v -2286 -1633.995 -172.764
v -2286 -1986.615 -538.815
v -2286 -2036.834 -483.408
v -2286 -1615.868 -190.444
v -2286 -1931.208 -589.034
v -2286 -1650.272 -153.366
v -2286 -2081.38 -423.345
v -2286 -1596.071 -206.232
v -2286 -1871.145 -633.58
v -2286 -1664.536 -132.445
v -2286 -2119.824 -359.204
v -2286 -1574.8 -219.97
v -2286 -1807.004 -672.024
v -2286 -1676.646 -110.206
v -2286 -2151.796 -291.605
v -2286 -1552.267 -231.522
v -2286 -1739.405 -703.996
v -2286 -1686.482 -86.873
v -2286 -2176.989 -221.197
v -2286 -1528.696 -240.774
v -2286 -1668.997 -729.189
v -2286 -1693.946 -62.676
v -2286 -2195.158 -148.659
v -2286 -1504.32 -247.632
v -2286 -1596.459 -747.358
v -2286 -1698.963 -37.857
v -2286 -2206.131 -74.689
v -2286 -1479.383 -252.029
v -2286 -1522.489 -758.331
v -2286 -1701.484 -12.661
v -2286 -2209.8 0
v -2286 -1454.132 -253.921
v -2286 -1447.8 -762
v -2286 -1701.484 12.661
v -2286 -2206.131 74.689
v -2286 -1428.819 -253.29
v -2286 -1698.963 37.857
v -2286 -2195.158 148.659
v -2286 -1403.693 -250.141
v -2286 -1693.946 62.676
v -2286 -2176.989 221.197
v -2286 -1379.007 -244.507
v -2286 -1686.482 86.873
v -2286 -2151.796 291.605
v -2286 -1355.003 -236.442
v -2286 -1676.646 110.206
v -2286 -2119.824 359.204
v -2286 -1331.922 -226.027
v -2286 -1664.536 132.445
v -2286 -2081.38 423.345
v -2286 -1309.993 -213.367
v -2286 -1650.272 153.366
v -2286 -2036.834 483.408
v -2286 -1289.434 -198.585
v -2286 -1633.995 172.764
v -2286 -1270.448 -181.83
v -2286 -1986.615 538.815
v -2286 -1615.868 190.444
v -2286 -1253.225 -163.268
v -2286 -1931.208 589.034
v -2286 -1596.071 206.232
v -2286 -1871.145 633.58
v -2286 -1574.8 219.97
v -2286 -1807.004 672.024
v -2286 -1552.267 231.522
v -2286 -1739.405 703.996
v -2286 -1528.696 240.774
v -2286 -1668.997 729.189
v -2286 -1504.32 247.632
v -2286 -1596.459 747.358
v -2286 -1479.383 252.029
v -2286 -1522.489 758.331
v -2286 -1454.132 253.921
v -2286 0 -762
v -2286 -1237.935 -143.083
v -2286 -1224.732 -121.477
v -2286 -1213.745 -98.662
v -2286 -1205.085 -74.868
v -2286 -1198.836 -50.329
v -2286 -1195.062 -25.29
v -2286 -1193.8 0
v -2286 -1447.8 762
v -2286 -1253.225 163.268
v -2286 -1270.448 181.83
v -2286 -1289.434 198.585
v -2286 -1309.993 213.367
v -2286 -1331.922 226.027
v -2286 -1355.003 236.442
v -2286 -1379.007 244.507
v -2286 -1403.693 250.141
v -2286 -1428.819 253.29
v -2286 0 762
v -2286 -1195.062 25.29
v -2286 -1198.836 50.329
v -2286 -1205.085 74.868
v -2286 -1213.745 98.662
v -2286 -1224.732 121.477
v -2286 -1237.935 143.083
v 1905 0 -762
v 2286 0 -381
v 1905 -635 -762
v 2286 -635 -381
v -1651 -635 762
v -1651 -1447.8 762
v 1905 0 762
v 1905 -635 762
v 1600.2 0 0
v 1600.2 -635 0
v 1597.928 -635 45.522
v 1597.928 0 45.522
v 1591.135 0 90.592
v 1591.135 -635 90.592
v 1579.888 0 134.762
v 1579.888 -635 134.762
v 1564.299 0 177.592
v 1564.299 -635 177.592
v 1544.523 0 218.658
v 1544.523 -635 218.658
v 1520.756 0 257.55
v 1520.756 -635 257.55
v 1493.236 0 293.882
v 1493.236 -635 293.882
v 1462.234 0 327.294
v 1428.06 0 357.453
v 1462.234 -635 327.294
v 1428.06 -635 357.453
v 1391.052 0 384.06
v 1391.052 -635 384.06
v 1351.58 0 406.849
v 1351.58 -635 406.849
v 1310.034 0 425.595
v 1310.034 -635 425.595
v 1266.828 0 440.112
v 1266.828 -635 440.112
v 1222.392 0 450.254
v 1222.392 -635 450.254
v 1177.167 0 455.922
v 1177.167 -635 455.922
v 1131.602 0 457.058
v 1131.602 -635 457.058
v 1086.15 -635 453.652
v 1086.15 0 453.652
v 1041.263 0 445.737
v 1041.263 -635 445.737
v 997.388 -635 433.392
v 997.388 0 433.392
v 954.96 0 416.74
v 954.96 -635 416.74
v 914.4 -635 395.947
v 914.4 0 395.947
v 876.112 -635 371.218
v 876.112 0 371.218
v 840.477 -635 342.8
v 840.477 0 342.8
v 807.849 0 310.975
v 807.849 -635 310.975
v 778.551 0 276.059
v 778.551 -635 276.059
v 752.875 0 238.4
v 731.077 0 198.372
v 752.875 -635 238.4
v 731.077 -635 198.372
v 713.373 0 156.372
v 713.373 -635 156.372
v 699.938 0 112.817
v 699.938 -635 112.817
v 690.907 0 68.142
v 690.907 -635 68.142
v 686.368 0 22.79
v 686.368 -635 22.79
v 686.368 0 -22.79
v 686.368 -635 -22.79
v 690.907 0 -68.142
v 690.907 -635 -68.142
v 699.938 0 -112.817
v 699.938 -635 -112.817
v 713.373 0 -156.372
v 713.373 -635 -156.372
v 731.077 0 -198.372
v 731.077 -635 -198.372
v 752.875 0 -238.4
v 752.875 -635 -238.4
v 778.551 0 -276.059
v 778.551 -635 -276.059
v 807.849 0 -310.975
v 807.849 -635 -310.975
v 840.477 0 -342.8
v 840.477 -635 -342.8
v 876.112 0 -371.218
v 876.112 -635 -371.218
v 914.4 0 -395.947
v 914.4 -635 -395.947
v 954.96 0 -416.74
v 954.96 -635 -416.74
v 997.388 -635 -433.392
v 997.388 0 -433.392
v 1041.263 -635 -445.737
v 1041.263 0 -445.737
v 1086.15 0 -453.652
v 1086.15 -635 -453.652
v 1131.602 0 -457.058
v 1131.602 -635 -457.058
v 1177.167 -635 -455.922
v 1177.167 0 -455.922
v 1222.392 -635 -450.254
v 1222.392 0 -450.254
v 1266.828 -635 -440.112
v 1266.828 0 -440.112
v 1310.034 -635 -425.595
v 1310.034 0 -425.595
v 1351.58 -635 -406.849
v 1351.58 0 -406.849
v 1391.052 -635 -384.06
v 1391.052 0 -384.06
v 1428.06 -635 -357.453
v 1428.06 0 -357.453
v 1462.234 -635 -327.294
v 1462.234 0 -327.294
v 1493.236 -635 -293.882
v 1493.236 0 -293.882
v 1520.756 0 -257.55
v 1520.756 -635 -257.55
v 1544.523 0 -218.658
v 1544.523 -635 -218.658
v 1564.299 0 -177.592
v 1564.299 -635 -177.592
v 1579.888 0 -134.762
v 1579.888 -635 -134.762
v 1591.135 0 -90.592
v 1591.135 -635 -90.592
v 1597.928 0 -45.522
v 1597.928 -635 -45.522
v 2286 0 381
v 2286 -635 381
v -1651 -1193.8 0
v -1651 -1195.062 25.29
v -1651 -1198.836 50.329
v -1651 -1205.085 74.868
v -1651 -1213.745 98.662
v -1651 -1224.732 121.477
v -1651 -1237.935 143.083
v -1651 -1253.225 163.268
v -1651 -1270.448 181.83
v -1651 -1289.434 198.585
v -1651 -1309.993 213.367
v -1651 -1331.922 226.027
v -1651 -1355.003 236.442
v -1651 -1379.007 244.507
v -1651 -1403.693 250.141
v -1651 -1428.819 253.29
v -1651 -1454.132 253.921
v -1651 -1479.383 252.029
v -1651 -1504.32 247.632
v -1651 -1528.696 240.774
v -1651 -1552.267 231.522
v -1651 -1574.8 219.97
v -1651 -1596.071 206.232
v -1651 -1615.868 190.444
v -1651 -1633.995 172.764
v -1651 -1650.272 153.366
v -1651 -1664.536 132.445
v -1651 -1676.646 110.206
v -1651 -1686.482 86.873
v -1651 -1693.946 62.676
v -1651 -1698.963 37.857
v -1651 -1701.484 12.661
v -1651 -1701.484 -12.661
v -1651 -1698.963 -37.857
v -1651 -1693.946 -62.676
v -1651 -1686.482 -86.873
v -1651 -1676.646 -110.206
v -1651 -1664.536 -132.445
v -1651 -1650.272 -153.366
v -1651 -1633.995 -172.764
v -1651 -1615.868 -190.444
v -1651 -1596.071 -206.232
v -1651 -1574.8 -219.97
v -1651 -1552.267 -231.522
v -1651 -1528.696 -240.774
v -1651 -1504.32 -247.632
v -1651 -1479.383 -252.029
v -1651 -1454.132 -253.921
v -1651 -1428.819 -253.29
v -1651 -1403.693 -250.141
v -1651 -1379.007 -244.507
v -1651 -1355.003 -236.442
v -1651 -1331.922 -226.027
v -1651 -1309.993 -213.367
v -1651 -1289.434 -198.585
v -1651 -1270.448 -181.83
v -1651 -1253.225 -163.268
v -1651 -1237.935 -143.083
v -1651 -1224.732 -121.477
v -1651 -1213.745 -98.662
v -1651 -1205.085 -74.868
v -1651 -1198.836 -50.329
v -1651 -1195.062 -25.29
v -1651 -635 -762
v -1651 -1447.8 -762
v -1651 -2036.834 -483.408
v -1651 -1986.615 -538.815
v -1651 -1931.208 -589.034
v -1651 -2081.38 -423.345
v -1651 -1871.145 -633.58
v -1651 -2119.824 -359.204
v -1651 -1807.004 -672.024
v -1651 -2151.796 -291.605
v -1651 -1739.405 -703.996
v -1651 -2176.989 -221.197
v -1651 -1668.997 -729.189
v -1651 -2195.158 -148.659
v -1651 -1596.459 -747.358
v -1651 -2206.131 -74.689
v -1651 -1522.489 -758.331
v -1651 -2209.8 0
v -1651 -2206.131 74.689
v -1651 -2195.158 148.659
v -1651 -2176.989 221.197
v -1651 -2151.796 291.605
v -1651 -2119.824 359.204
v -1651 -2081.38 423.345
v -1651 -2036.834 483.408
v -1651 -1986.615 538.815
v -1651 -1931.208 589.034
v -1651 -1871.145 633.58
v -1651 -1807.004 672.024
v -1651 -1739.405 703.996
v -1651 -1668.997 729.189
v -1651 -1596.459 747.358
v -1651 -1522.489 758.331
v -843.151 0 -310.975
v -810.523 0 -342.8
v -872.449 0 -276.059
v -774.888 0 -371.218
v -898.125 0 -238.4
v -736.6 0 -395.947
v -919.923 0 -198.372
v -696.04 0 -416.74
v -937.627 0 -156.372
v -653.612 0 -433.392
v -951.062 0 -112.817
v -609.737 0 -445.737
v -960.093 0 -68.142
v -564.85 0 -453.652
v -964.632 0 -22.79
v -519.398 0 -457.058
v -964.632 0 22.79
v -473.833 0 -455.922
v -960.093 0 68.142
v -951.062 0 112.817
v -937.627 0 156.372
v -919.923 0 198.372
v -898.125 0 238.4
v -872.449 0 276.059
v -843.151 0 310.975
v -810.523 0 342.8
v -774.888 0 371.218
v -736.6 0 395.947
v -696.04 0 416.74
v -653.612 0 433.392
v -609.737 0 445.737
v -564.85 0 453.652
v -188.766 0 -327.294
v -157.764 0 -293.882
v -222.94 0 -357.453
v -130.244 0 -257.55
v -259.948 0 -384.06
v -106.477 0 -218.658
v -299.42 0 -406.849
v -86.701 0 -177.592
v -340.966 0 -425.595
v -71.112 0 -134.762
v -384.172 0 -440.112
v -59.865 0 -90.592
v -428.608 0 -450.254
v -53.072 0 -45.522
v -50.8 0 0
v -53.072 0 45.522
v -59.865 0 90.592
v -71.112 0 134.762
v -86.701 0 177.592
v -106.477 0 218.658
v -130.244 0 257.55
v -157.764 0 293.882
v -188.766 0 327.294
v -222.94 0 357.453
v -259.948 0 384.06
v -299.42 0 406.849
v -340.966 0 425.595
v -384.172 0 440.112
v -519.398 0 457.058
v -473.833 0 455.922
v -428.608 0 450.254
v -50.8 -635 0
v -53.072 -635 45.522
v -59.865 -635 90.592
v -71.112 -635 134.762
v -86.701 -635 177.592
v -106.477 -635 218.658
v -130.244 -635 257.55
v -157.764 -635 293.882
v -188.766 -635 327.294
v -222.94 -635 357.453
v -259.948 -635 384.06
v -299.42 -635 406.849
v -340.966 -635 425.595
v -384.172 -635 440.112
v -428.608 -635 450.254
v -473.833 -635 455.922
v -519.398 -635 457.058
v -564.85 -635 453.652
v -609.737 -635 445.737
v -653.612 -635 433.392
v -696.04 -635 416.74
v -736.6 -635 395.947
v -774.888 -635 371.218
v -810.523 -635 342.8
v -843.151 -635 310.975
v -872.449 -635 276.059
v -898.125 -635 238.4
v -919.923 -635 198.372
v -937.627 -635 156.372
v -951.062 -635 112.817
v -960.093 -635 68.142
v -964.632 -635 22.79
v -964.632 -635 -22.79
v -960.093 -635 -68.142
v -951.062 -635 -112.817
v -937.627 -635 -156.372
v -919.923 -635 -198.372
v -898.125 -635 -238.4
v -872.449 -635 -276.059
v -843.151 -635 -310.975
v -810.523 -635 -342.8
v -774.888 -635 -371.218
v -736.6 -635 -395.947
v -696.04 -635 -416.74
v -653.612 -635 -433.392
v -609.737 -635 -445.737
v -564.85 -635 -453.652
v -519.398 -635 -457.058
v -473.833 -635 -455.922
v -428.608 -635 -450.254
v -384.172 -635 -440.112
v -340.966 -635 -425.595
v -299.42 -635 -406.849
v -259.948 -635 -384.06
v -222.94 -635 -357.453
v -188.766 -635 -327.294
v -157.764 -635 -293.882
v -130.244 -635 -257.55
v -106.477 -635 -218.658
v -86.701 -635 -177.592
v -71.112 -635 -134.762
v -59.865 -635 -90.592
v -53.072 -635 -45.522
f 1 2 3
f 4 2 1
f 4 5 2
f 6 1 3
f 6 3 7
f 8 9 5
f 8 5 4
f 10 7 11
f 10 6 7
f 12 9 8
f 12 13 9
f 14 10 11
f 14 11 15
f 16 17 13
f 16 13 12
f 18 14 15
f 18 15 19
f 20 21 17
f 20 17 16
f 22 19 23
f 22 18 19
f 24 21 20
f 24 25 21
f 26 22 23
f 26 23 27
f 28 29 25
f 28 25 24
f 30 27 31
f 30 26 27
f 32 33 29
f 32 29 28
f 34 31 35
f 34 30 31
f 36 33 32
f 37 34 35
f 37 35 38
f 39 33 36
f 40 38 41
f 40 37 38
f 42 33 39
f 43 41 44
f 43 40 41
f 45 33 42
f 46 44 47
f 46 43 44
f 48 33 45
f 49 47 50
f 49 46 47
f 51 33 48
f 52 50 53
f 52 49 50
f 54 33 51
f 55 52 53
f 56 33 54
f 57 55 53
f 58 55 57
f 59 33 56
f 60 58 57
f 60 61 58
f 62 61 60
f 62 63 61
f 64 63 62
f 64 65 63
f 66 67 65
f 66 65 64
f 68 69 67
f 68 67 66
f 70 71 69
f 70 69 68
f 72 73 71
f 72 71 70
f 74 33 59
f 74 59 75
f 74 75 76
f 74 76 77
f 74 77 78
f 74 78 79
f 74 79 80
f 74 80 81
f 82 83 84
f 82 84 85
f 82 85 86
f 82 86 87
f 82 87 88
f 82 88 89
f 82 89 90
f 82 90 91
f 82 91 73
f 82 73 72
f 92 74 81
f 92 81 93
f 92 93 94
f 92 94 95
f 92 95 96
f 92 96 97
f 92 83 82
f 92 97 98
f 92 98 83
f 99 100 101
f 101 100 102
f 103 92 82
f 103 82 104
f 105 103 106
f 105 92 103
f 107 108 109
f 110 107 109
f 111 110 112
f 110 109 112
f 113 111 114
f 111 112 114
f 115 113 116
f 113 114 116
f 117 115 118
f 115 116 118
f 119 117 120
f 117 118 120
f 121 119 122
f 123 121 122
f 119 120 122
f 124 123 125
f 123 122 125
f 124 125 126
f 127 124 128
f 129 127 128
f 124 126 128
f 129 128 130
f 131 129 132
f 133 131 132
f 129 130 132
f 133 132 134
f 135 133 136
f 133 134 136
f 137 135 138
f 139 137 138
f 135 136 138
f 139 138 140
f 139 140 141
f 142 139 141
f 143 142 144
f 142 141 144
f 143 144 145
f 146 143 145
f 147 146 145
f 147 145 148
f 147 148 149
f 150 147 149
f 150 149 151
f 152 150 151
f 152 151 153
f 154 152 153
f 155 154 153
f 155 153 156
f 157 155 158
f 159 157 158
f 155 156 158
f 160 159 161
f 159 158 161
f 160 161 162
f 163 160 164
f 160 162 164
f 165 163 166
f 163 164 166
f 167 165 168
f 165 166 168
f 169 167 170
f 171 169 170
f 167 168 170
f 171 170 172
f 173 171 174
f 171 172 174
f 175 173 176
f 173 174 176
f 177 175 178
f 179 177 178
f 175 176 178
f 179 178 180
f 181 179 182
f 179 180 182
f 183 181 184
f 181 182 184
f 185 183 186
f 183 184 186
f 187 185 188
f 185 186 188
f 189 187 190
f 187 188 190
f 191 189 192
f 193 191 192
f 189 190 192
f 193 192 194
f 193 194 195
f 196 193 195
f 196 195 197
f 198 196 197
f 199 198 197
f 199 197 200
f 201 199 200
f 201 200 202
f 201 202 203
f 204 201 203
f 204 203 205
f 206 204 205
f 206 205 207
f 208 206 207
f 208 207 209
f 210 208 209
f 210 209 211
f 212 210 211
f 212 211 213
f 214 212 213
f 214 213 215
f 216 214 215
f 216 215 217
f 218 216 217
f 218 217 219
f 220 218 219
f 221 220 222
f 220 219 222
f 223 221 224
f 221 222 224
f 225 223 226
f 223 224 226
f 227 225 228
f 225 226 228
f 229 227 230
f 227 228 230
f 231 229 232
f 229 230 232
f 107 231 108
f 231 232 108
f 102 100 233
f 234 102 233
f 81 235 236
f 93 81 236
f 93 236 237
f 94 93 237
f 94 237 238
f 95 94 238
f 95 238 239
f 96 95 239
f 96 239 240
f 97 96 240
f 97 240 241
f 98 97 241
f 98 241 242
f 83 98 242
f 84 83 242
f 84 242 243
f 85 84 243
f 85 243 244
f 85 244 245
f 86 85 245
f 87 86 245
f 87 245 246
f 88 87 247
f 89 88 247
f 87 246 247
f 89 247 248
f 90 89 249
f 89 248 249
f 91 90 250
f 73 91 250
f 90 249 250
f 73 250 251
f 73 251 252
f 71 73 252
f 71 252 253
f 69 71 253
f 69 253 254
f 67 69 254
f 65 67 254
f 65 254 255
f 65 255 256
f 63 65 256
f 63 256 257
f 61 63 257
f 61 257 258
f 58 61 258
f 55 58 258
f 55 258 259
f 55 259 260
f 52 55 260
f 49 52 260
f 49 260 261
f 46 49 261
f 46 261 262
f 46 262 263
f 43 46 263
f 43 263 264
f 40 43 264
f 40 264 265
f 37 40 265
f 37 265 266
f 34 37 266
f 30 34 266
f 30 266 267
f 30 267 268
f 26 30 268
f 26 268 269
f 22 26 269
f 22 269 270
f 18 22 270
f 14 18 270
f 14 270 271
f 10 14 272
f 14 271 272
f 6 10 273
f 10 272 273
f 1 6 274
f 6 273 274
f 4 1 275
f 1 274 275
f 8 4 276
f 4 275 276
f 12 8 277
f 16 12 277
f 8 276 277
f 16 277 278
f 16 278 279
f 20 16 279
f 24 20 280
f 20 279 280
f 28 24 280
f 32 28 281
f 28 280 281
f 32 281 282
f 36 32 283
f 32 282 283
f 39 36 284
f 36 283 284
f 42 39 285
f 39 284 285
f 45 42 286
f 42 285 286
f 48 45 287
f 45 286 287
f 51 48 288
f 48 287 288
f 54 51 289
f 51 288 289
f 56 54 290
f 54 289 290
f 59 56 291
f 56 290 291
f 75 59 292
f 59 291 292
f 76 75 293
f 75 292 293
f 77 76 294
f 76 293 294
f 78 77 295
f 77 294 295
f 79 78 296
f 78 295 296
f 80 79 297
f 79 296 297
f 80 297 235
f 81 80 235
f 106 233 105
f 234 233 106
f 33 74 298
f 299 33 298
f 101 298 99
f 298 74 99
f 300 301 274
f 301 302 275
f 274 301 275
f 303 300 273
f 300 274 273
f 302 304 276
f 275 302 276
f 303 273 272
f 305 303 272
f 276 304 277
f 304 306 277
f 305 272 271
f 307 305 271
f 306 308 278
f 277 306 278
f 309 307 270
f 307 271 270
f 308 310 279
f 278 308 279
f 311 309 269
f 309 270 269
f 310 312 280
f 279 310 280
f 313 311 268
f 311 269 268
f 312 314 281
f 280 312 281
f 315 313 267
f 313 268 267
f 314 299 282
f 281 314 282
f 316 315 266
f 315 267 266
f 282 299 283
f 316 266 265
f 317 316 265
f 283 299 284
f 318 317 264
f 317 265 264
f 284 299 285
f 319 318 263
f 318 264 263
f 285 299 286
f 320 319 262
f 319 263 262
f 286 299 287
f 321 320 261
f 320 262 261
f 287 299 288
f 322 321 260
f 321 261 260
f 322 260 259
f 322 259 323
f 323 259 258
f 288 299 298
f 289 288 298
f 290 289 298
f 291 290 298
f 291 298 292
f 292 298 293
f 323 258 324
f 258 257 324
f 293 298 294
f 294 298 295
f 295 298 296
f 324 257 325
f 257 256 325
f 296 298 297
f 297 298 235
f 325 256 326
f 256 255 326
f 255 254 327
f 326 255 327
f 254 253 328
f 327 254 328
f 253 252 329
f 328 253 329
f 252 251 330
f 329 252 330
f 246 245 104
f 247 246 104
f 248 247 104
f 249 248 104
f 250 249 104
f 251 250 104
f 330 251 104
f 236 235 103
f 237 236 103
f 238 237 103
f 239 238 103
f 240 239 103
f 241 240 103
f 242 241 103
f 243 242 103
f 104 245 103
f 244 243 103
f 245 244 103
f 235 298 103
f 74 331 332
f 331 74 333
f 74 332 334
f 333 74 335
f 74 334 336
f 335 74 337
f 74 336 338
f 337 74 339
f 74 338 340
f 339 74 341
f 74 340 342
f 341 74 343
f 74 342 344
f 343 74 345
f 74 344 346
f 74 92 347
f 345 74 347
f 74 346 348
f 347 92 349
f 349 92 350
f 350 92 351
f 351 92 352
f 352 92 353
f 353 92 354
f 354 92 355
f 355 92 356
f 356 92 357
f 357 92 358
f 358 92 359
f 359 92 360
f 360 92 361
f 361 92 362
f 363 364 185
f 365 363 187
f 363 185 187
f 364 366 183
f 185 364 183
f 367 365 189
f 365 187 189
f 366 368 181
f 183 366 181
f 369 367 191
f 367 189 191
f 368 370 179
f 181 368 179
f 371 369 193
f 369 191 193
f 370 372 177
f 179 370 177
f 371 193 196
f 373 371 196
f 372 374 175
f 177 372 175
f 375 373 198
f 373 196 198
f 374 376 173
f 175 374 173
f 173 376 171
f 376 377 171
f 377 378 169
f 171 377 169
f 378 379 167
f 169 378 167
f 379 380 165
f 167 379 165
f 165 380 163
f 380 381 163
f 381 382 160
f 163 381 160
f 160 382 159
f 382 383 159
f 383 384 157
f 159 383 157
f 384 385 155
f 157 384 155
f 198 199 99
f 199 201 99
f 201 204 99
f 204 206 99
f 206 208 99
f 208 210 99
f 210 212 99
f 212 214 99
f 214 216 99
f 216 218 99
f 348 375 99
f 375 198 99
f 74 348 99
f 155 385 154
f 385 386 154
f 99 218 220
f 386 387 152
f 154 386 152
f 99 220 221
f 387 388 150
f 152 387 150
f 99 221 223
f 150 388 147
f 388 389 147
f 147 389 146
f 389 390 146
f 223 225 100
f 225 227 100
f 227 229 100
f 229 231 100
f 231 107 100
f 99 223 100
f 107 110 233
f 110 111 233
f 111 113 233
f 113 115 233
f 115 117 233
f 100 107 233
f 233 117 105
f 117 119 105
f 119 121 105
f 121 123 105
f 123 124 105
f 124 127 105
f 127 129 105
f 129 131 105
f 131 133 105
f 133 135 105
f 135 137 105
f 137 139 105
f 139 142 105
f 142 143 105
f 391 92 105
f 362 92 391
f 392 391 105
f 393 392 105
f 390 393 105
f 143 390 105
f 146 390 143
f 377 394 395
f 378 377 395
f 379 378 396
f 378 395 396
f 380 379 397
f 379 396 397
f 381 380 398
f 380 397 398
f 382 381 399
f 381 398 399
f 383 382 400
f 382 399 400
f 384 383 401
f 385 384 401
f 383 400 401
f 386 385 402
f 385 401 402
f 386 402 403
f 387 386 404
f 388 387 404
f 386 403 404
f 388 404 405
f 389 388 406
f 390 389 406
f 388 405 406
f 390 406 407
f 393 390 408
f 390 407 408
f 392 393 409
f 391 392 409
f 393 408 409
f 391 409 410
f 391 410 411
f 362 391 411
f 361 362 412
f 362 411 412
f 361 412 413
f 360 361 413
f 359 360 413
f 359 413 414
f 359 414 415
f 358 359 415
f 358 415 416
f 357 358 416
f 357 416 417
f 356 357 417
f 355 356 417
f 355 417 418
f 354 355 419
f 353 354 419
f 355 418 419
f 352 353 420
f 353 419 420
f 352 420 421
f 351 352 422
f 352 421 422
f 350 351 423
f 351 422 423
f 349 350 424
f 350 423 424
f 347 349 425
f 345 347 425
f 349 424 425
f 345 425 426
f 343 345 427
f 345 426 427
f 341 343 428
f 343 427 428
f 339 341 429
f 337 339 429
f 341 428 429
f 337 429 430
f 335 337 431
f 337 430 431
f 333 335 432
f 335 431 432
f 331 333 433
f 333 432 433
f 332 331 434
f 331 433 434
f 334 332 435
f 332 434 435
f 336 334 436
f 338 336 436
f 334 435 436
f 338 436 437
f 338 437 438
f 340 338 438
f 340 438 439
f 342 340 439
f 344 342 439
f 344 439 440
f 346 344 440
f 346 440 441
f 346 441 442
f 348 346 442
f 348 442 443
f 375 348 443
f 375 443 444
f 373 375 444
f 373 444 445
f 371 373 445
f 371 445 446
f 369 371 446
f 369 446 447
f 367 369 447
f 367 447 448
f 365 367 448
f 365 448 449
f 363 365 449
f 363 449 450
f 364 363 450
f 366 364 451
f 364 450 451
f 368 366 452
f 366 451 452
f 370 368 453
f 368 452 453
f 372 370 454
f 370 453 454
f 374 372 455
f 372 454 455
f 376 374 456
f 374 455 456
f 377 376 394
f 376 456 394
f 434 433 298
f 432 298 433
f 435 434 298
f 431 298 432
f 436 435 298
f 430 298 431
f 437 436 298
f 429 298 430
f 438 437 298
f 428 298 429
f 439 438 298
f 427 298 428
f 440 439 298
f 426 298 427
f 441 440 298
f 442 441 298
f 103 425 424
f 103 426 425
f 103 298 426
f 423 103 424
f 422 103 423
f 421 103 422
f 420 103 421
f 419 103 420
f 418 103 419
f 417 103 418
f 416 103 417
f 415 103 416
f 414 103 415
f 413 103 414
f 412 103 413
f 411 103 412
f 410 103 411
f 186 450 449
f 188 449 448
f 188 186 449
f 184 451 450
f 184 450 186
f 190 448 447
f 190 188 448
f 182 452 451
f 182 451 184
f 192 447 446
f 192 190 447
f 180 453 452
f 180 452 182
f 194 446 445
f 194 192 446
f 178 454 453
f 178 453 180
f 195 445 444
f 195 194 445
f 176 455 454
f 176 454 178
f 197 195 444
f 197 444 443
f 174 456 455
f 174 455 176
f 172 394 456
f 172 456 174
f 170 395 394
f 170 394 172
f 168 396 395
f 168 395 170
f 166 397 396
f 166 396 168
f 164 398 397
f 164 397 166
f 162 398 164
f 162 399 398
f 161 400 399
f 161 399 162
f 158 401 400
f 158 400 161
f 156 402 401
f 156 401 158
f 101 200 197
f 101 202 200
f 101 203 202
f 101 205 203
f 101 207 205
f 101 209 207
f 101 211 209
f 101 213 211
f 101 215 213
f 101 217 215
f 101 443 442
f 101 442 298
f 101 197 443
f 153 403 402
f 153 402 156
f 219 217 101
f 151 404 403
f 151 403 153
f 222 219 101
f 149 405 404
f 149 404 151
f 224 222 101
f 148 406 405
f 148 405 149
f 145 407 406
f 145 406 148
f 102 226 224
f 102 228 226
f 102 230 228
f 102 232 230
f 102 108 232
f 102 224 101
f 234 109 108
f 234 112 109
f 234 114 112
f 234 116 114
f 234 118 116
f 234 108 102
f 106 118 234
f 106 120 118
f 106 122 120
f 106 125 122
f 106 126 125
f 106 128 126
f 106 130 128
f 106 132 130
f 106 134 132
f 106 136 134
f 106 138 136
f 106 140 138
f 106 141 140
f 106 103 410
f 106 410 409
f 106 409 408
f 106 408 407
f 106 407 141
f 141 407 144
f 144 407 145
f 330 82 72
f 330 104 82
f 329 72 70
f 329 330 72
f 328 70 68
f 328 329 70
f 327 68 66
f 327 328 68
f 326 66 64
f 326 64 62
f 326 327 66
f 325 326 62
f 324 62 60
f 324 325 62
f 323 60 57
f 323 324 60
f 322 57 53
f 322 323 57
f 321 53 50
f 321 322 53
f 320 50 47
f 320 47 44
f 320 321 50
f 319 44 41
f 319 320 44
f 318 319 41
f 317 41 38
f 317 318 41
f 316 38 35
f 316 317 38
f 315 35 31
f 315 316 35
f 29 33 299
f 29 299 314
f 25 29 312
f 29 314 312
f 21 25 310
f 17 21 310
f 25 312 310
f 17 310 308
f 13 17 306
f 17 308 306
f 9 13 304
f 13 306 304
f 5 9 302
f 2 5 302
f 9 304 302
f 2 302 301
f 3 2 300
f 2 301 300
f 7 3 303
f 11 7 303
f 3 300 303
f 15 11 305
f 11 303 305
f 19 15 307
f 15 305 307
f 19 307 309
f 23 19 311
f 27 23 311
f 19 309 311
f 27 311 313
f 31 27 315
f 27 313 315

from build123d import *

# Parameters (mm, degrees)
F0_W     = 4572
F0_H     = 1524
F1_DEPTH = 635
F2_W     = 635
F2_H     = 1524
F3_DEPTH = 1574.8
F4_R     = 761.99999
F5_R     = 457.2
F6_DEPTH = 635
F7_R     = 254
F8_DEPTH = 635.001
F9_SIZE  = 381


# Not quite as in the source:
# - a fillet or chamfer is up to 0.001 mm smaller than in the source, because OpenCascade refuses the exact size


with BuildPart() as f1:
    # F0 (on Front) → F1 (new body)
    with BuildSketch(Plane.XZ):
        Rectangle(F0_W, F0_H)
    extrude(amount=F1_DEPTH)

    # F2 (on face) → F3 (join)
    with BuildSketch(Plane.XZ.offset(635)):
        with Locations((-1968.5, 0)):
            Rectangle(F2_W, F2_H)
    extrude(amount=F3_DEPTH)

    # F4 (radius 762 in the source; OpenCascade refuses exactly that, so slightly less here)
    f4_edges = [f1.edges().sort_by_distance(p)[0] for p in [
        (-1968.5, -2209.8, 762),
        (-1968.5, -2209.8, -762),
    ]]
    fillet(f4_edges, radius=F4_R)

    # F5 (on face) → F6 (cut)
    with BuildSketch(Plane.XZ.offset(635)):
        with Locations((-508, 0)):
            Circle(F5_R)
        with Locations((1143, 0)):
            Circle(F5_R)
    extrude(amount=-F6_DEPTH, mode=Mode.SUBTRACT)

    # F7 (on face) → F8 (cut, through all)
    with BuildSketch(Plane.YZ.offset(-1651)):
        with Locations((-1447.8, 0)):
            Circle(F7_R)
    extrude(amount=-F8_DEPTH, mode=Mode.SUBTRACT)

    # F9
    f9_edges = [f1.edges().sort_by_distance(p)[0] for p in [
        (2286, -317.5, -762),
        (2286, -317.5, 762),
    ]]
    chamfer(f9_edges, length=F9_SIZE)


solid = f1.part
